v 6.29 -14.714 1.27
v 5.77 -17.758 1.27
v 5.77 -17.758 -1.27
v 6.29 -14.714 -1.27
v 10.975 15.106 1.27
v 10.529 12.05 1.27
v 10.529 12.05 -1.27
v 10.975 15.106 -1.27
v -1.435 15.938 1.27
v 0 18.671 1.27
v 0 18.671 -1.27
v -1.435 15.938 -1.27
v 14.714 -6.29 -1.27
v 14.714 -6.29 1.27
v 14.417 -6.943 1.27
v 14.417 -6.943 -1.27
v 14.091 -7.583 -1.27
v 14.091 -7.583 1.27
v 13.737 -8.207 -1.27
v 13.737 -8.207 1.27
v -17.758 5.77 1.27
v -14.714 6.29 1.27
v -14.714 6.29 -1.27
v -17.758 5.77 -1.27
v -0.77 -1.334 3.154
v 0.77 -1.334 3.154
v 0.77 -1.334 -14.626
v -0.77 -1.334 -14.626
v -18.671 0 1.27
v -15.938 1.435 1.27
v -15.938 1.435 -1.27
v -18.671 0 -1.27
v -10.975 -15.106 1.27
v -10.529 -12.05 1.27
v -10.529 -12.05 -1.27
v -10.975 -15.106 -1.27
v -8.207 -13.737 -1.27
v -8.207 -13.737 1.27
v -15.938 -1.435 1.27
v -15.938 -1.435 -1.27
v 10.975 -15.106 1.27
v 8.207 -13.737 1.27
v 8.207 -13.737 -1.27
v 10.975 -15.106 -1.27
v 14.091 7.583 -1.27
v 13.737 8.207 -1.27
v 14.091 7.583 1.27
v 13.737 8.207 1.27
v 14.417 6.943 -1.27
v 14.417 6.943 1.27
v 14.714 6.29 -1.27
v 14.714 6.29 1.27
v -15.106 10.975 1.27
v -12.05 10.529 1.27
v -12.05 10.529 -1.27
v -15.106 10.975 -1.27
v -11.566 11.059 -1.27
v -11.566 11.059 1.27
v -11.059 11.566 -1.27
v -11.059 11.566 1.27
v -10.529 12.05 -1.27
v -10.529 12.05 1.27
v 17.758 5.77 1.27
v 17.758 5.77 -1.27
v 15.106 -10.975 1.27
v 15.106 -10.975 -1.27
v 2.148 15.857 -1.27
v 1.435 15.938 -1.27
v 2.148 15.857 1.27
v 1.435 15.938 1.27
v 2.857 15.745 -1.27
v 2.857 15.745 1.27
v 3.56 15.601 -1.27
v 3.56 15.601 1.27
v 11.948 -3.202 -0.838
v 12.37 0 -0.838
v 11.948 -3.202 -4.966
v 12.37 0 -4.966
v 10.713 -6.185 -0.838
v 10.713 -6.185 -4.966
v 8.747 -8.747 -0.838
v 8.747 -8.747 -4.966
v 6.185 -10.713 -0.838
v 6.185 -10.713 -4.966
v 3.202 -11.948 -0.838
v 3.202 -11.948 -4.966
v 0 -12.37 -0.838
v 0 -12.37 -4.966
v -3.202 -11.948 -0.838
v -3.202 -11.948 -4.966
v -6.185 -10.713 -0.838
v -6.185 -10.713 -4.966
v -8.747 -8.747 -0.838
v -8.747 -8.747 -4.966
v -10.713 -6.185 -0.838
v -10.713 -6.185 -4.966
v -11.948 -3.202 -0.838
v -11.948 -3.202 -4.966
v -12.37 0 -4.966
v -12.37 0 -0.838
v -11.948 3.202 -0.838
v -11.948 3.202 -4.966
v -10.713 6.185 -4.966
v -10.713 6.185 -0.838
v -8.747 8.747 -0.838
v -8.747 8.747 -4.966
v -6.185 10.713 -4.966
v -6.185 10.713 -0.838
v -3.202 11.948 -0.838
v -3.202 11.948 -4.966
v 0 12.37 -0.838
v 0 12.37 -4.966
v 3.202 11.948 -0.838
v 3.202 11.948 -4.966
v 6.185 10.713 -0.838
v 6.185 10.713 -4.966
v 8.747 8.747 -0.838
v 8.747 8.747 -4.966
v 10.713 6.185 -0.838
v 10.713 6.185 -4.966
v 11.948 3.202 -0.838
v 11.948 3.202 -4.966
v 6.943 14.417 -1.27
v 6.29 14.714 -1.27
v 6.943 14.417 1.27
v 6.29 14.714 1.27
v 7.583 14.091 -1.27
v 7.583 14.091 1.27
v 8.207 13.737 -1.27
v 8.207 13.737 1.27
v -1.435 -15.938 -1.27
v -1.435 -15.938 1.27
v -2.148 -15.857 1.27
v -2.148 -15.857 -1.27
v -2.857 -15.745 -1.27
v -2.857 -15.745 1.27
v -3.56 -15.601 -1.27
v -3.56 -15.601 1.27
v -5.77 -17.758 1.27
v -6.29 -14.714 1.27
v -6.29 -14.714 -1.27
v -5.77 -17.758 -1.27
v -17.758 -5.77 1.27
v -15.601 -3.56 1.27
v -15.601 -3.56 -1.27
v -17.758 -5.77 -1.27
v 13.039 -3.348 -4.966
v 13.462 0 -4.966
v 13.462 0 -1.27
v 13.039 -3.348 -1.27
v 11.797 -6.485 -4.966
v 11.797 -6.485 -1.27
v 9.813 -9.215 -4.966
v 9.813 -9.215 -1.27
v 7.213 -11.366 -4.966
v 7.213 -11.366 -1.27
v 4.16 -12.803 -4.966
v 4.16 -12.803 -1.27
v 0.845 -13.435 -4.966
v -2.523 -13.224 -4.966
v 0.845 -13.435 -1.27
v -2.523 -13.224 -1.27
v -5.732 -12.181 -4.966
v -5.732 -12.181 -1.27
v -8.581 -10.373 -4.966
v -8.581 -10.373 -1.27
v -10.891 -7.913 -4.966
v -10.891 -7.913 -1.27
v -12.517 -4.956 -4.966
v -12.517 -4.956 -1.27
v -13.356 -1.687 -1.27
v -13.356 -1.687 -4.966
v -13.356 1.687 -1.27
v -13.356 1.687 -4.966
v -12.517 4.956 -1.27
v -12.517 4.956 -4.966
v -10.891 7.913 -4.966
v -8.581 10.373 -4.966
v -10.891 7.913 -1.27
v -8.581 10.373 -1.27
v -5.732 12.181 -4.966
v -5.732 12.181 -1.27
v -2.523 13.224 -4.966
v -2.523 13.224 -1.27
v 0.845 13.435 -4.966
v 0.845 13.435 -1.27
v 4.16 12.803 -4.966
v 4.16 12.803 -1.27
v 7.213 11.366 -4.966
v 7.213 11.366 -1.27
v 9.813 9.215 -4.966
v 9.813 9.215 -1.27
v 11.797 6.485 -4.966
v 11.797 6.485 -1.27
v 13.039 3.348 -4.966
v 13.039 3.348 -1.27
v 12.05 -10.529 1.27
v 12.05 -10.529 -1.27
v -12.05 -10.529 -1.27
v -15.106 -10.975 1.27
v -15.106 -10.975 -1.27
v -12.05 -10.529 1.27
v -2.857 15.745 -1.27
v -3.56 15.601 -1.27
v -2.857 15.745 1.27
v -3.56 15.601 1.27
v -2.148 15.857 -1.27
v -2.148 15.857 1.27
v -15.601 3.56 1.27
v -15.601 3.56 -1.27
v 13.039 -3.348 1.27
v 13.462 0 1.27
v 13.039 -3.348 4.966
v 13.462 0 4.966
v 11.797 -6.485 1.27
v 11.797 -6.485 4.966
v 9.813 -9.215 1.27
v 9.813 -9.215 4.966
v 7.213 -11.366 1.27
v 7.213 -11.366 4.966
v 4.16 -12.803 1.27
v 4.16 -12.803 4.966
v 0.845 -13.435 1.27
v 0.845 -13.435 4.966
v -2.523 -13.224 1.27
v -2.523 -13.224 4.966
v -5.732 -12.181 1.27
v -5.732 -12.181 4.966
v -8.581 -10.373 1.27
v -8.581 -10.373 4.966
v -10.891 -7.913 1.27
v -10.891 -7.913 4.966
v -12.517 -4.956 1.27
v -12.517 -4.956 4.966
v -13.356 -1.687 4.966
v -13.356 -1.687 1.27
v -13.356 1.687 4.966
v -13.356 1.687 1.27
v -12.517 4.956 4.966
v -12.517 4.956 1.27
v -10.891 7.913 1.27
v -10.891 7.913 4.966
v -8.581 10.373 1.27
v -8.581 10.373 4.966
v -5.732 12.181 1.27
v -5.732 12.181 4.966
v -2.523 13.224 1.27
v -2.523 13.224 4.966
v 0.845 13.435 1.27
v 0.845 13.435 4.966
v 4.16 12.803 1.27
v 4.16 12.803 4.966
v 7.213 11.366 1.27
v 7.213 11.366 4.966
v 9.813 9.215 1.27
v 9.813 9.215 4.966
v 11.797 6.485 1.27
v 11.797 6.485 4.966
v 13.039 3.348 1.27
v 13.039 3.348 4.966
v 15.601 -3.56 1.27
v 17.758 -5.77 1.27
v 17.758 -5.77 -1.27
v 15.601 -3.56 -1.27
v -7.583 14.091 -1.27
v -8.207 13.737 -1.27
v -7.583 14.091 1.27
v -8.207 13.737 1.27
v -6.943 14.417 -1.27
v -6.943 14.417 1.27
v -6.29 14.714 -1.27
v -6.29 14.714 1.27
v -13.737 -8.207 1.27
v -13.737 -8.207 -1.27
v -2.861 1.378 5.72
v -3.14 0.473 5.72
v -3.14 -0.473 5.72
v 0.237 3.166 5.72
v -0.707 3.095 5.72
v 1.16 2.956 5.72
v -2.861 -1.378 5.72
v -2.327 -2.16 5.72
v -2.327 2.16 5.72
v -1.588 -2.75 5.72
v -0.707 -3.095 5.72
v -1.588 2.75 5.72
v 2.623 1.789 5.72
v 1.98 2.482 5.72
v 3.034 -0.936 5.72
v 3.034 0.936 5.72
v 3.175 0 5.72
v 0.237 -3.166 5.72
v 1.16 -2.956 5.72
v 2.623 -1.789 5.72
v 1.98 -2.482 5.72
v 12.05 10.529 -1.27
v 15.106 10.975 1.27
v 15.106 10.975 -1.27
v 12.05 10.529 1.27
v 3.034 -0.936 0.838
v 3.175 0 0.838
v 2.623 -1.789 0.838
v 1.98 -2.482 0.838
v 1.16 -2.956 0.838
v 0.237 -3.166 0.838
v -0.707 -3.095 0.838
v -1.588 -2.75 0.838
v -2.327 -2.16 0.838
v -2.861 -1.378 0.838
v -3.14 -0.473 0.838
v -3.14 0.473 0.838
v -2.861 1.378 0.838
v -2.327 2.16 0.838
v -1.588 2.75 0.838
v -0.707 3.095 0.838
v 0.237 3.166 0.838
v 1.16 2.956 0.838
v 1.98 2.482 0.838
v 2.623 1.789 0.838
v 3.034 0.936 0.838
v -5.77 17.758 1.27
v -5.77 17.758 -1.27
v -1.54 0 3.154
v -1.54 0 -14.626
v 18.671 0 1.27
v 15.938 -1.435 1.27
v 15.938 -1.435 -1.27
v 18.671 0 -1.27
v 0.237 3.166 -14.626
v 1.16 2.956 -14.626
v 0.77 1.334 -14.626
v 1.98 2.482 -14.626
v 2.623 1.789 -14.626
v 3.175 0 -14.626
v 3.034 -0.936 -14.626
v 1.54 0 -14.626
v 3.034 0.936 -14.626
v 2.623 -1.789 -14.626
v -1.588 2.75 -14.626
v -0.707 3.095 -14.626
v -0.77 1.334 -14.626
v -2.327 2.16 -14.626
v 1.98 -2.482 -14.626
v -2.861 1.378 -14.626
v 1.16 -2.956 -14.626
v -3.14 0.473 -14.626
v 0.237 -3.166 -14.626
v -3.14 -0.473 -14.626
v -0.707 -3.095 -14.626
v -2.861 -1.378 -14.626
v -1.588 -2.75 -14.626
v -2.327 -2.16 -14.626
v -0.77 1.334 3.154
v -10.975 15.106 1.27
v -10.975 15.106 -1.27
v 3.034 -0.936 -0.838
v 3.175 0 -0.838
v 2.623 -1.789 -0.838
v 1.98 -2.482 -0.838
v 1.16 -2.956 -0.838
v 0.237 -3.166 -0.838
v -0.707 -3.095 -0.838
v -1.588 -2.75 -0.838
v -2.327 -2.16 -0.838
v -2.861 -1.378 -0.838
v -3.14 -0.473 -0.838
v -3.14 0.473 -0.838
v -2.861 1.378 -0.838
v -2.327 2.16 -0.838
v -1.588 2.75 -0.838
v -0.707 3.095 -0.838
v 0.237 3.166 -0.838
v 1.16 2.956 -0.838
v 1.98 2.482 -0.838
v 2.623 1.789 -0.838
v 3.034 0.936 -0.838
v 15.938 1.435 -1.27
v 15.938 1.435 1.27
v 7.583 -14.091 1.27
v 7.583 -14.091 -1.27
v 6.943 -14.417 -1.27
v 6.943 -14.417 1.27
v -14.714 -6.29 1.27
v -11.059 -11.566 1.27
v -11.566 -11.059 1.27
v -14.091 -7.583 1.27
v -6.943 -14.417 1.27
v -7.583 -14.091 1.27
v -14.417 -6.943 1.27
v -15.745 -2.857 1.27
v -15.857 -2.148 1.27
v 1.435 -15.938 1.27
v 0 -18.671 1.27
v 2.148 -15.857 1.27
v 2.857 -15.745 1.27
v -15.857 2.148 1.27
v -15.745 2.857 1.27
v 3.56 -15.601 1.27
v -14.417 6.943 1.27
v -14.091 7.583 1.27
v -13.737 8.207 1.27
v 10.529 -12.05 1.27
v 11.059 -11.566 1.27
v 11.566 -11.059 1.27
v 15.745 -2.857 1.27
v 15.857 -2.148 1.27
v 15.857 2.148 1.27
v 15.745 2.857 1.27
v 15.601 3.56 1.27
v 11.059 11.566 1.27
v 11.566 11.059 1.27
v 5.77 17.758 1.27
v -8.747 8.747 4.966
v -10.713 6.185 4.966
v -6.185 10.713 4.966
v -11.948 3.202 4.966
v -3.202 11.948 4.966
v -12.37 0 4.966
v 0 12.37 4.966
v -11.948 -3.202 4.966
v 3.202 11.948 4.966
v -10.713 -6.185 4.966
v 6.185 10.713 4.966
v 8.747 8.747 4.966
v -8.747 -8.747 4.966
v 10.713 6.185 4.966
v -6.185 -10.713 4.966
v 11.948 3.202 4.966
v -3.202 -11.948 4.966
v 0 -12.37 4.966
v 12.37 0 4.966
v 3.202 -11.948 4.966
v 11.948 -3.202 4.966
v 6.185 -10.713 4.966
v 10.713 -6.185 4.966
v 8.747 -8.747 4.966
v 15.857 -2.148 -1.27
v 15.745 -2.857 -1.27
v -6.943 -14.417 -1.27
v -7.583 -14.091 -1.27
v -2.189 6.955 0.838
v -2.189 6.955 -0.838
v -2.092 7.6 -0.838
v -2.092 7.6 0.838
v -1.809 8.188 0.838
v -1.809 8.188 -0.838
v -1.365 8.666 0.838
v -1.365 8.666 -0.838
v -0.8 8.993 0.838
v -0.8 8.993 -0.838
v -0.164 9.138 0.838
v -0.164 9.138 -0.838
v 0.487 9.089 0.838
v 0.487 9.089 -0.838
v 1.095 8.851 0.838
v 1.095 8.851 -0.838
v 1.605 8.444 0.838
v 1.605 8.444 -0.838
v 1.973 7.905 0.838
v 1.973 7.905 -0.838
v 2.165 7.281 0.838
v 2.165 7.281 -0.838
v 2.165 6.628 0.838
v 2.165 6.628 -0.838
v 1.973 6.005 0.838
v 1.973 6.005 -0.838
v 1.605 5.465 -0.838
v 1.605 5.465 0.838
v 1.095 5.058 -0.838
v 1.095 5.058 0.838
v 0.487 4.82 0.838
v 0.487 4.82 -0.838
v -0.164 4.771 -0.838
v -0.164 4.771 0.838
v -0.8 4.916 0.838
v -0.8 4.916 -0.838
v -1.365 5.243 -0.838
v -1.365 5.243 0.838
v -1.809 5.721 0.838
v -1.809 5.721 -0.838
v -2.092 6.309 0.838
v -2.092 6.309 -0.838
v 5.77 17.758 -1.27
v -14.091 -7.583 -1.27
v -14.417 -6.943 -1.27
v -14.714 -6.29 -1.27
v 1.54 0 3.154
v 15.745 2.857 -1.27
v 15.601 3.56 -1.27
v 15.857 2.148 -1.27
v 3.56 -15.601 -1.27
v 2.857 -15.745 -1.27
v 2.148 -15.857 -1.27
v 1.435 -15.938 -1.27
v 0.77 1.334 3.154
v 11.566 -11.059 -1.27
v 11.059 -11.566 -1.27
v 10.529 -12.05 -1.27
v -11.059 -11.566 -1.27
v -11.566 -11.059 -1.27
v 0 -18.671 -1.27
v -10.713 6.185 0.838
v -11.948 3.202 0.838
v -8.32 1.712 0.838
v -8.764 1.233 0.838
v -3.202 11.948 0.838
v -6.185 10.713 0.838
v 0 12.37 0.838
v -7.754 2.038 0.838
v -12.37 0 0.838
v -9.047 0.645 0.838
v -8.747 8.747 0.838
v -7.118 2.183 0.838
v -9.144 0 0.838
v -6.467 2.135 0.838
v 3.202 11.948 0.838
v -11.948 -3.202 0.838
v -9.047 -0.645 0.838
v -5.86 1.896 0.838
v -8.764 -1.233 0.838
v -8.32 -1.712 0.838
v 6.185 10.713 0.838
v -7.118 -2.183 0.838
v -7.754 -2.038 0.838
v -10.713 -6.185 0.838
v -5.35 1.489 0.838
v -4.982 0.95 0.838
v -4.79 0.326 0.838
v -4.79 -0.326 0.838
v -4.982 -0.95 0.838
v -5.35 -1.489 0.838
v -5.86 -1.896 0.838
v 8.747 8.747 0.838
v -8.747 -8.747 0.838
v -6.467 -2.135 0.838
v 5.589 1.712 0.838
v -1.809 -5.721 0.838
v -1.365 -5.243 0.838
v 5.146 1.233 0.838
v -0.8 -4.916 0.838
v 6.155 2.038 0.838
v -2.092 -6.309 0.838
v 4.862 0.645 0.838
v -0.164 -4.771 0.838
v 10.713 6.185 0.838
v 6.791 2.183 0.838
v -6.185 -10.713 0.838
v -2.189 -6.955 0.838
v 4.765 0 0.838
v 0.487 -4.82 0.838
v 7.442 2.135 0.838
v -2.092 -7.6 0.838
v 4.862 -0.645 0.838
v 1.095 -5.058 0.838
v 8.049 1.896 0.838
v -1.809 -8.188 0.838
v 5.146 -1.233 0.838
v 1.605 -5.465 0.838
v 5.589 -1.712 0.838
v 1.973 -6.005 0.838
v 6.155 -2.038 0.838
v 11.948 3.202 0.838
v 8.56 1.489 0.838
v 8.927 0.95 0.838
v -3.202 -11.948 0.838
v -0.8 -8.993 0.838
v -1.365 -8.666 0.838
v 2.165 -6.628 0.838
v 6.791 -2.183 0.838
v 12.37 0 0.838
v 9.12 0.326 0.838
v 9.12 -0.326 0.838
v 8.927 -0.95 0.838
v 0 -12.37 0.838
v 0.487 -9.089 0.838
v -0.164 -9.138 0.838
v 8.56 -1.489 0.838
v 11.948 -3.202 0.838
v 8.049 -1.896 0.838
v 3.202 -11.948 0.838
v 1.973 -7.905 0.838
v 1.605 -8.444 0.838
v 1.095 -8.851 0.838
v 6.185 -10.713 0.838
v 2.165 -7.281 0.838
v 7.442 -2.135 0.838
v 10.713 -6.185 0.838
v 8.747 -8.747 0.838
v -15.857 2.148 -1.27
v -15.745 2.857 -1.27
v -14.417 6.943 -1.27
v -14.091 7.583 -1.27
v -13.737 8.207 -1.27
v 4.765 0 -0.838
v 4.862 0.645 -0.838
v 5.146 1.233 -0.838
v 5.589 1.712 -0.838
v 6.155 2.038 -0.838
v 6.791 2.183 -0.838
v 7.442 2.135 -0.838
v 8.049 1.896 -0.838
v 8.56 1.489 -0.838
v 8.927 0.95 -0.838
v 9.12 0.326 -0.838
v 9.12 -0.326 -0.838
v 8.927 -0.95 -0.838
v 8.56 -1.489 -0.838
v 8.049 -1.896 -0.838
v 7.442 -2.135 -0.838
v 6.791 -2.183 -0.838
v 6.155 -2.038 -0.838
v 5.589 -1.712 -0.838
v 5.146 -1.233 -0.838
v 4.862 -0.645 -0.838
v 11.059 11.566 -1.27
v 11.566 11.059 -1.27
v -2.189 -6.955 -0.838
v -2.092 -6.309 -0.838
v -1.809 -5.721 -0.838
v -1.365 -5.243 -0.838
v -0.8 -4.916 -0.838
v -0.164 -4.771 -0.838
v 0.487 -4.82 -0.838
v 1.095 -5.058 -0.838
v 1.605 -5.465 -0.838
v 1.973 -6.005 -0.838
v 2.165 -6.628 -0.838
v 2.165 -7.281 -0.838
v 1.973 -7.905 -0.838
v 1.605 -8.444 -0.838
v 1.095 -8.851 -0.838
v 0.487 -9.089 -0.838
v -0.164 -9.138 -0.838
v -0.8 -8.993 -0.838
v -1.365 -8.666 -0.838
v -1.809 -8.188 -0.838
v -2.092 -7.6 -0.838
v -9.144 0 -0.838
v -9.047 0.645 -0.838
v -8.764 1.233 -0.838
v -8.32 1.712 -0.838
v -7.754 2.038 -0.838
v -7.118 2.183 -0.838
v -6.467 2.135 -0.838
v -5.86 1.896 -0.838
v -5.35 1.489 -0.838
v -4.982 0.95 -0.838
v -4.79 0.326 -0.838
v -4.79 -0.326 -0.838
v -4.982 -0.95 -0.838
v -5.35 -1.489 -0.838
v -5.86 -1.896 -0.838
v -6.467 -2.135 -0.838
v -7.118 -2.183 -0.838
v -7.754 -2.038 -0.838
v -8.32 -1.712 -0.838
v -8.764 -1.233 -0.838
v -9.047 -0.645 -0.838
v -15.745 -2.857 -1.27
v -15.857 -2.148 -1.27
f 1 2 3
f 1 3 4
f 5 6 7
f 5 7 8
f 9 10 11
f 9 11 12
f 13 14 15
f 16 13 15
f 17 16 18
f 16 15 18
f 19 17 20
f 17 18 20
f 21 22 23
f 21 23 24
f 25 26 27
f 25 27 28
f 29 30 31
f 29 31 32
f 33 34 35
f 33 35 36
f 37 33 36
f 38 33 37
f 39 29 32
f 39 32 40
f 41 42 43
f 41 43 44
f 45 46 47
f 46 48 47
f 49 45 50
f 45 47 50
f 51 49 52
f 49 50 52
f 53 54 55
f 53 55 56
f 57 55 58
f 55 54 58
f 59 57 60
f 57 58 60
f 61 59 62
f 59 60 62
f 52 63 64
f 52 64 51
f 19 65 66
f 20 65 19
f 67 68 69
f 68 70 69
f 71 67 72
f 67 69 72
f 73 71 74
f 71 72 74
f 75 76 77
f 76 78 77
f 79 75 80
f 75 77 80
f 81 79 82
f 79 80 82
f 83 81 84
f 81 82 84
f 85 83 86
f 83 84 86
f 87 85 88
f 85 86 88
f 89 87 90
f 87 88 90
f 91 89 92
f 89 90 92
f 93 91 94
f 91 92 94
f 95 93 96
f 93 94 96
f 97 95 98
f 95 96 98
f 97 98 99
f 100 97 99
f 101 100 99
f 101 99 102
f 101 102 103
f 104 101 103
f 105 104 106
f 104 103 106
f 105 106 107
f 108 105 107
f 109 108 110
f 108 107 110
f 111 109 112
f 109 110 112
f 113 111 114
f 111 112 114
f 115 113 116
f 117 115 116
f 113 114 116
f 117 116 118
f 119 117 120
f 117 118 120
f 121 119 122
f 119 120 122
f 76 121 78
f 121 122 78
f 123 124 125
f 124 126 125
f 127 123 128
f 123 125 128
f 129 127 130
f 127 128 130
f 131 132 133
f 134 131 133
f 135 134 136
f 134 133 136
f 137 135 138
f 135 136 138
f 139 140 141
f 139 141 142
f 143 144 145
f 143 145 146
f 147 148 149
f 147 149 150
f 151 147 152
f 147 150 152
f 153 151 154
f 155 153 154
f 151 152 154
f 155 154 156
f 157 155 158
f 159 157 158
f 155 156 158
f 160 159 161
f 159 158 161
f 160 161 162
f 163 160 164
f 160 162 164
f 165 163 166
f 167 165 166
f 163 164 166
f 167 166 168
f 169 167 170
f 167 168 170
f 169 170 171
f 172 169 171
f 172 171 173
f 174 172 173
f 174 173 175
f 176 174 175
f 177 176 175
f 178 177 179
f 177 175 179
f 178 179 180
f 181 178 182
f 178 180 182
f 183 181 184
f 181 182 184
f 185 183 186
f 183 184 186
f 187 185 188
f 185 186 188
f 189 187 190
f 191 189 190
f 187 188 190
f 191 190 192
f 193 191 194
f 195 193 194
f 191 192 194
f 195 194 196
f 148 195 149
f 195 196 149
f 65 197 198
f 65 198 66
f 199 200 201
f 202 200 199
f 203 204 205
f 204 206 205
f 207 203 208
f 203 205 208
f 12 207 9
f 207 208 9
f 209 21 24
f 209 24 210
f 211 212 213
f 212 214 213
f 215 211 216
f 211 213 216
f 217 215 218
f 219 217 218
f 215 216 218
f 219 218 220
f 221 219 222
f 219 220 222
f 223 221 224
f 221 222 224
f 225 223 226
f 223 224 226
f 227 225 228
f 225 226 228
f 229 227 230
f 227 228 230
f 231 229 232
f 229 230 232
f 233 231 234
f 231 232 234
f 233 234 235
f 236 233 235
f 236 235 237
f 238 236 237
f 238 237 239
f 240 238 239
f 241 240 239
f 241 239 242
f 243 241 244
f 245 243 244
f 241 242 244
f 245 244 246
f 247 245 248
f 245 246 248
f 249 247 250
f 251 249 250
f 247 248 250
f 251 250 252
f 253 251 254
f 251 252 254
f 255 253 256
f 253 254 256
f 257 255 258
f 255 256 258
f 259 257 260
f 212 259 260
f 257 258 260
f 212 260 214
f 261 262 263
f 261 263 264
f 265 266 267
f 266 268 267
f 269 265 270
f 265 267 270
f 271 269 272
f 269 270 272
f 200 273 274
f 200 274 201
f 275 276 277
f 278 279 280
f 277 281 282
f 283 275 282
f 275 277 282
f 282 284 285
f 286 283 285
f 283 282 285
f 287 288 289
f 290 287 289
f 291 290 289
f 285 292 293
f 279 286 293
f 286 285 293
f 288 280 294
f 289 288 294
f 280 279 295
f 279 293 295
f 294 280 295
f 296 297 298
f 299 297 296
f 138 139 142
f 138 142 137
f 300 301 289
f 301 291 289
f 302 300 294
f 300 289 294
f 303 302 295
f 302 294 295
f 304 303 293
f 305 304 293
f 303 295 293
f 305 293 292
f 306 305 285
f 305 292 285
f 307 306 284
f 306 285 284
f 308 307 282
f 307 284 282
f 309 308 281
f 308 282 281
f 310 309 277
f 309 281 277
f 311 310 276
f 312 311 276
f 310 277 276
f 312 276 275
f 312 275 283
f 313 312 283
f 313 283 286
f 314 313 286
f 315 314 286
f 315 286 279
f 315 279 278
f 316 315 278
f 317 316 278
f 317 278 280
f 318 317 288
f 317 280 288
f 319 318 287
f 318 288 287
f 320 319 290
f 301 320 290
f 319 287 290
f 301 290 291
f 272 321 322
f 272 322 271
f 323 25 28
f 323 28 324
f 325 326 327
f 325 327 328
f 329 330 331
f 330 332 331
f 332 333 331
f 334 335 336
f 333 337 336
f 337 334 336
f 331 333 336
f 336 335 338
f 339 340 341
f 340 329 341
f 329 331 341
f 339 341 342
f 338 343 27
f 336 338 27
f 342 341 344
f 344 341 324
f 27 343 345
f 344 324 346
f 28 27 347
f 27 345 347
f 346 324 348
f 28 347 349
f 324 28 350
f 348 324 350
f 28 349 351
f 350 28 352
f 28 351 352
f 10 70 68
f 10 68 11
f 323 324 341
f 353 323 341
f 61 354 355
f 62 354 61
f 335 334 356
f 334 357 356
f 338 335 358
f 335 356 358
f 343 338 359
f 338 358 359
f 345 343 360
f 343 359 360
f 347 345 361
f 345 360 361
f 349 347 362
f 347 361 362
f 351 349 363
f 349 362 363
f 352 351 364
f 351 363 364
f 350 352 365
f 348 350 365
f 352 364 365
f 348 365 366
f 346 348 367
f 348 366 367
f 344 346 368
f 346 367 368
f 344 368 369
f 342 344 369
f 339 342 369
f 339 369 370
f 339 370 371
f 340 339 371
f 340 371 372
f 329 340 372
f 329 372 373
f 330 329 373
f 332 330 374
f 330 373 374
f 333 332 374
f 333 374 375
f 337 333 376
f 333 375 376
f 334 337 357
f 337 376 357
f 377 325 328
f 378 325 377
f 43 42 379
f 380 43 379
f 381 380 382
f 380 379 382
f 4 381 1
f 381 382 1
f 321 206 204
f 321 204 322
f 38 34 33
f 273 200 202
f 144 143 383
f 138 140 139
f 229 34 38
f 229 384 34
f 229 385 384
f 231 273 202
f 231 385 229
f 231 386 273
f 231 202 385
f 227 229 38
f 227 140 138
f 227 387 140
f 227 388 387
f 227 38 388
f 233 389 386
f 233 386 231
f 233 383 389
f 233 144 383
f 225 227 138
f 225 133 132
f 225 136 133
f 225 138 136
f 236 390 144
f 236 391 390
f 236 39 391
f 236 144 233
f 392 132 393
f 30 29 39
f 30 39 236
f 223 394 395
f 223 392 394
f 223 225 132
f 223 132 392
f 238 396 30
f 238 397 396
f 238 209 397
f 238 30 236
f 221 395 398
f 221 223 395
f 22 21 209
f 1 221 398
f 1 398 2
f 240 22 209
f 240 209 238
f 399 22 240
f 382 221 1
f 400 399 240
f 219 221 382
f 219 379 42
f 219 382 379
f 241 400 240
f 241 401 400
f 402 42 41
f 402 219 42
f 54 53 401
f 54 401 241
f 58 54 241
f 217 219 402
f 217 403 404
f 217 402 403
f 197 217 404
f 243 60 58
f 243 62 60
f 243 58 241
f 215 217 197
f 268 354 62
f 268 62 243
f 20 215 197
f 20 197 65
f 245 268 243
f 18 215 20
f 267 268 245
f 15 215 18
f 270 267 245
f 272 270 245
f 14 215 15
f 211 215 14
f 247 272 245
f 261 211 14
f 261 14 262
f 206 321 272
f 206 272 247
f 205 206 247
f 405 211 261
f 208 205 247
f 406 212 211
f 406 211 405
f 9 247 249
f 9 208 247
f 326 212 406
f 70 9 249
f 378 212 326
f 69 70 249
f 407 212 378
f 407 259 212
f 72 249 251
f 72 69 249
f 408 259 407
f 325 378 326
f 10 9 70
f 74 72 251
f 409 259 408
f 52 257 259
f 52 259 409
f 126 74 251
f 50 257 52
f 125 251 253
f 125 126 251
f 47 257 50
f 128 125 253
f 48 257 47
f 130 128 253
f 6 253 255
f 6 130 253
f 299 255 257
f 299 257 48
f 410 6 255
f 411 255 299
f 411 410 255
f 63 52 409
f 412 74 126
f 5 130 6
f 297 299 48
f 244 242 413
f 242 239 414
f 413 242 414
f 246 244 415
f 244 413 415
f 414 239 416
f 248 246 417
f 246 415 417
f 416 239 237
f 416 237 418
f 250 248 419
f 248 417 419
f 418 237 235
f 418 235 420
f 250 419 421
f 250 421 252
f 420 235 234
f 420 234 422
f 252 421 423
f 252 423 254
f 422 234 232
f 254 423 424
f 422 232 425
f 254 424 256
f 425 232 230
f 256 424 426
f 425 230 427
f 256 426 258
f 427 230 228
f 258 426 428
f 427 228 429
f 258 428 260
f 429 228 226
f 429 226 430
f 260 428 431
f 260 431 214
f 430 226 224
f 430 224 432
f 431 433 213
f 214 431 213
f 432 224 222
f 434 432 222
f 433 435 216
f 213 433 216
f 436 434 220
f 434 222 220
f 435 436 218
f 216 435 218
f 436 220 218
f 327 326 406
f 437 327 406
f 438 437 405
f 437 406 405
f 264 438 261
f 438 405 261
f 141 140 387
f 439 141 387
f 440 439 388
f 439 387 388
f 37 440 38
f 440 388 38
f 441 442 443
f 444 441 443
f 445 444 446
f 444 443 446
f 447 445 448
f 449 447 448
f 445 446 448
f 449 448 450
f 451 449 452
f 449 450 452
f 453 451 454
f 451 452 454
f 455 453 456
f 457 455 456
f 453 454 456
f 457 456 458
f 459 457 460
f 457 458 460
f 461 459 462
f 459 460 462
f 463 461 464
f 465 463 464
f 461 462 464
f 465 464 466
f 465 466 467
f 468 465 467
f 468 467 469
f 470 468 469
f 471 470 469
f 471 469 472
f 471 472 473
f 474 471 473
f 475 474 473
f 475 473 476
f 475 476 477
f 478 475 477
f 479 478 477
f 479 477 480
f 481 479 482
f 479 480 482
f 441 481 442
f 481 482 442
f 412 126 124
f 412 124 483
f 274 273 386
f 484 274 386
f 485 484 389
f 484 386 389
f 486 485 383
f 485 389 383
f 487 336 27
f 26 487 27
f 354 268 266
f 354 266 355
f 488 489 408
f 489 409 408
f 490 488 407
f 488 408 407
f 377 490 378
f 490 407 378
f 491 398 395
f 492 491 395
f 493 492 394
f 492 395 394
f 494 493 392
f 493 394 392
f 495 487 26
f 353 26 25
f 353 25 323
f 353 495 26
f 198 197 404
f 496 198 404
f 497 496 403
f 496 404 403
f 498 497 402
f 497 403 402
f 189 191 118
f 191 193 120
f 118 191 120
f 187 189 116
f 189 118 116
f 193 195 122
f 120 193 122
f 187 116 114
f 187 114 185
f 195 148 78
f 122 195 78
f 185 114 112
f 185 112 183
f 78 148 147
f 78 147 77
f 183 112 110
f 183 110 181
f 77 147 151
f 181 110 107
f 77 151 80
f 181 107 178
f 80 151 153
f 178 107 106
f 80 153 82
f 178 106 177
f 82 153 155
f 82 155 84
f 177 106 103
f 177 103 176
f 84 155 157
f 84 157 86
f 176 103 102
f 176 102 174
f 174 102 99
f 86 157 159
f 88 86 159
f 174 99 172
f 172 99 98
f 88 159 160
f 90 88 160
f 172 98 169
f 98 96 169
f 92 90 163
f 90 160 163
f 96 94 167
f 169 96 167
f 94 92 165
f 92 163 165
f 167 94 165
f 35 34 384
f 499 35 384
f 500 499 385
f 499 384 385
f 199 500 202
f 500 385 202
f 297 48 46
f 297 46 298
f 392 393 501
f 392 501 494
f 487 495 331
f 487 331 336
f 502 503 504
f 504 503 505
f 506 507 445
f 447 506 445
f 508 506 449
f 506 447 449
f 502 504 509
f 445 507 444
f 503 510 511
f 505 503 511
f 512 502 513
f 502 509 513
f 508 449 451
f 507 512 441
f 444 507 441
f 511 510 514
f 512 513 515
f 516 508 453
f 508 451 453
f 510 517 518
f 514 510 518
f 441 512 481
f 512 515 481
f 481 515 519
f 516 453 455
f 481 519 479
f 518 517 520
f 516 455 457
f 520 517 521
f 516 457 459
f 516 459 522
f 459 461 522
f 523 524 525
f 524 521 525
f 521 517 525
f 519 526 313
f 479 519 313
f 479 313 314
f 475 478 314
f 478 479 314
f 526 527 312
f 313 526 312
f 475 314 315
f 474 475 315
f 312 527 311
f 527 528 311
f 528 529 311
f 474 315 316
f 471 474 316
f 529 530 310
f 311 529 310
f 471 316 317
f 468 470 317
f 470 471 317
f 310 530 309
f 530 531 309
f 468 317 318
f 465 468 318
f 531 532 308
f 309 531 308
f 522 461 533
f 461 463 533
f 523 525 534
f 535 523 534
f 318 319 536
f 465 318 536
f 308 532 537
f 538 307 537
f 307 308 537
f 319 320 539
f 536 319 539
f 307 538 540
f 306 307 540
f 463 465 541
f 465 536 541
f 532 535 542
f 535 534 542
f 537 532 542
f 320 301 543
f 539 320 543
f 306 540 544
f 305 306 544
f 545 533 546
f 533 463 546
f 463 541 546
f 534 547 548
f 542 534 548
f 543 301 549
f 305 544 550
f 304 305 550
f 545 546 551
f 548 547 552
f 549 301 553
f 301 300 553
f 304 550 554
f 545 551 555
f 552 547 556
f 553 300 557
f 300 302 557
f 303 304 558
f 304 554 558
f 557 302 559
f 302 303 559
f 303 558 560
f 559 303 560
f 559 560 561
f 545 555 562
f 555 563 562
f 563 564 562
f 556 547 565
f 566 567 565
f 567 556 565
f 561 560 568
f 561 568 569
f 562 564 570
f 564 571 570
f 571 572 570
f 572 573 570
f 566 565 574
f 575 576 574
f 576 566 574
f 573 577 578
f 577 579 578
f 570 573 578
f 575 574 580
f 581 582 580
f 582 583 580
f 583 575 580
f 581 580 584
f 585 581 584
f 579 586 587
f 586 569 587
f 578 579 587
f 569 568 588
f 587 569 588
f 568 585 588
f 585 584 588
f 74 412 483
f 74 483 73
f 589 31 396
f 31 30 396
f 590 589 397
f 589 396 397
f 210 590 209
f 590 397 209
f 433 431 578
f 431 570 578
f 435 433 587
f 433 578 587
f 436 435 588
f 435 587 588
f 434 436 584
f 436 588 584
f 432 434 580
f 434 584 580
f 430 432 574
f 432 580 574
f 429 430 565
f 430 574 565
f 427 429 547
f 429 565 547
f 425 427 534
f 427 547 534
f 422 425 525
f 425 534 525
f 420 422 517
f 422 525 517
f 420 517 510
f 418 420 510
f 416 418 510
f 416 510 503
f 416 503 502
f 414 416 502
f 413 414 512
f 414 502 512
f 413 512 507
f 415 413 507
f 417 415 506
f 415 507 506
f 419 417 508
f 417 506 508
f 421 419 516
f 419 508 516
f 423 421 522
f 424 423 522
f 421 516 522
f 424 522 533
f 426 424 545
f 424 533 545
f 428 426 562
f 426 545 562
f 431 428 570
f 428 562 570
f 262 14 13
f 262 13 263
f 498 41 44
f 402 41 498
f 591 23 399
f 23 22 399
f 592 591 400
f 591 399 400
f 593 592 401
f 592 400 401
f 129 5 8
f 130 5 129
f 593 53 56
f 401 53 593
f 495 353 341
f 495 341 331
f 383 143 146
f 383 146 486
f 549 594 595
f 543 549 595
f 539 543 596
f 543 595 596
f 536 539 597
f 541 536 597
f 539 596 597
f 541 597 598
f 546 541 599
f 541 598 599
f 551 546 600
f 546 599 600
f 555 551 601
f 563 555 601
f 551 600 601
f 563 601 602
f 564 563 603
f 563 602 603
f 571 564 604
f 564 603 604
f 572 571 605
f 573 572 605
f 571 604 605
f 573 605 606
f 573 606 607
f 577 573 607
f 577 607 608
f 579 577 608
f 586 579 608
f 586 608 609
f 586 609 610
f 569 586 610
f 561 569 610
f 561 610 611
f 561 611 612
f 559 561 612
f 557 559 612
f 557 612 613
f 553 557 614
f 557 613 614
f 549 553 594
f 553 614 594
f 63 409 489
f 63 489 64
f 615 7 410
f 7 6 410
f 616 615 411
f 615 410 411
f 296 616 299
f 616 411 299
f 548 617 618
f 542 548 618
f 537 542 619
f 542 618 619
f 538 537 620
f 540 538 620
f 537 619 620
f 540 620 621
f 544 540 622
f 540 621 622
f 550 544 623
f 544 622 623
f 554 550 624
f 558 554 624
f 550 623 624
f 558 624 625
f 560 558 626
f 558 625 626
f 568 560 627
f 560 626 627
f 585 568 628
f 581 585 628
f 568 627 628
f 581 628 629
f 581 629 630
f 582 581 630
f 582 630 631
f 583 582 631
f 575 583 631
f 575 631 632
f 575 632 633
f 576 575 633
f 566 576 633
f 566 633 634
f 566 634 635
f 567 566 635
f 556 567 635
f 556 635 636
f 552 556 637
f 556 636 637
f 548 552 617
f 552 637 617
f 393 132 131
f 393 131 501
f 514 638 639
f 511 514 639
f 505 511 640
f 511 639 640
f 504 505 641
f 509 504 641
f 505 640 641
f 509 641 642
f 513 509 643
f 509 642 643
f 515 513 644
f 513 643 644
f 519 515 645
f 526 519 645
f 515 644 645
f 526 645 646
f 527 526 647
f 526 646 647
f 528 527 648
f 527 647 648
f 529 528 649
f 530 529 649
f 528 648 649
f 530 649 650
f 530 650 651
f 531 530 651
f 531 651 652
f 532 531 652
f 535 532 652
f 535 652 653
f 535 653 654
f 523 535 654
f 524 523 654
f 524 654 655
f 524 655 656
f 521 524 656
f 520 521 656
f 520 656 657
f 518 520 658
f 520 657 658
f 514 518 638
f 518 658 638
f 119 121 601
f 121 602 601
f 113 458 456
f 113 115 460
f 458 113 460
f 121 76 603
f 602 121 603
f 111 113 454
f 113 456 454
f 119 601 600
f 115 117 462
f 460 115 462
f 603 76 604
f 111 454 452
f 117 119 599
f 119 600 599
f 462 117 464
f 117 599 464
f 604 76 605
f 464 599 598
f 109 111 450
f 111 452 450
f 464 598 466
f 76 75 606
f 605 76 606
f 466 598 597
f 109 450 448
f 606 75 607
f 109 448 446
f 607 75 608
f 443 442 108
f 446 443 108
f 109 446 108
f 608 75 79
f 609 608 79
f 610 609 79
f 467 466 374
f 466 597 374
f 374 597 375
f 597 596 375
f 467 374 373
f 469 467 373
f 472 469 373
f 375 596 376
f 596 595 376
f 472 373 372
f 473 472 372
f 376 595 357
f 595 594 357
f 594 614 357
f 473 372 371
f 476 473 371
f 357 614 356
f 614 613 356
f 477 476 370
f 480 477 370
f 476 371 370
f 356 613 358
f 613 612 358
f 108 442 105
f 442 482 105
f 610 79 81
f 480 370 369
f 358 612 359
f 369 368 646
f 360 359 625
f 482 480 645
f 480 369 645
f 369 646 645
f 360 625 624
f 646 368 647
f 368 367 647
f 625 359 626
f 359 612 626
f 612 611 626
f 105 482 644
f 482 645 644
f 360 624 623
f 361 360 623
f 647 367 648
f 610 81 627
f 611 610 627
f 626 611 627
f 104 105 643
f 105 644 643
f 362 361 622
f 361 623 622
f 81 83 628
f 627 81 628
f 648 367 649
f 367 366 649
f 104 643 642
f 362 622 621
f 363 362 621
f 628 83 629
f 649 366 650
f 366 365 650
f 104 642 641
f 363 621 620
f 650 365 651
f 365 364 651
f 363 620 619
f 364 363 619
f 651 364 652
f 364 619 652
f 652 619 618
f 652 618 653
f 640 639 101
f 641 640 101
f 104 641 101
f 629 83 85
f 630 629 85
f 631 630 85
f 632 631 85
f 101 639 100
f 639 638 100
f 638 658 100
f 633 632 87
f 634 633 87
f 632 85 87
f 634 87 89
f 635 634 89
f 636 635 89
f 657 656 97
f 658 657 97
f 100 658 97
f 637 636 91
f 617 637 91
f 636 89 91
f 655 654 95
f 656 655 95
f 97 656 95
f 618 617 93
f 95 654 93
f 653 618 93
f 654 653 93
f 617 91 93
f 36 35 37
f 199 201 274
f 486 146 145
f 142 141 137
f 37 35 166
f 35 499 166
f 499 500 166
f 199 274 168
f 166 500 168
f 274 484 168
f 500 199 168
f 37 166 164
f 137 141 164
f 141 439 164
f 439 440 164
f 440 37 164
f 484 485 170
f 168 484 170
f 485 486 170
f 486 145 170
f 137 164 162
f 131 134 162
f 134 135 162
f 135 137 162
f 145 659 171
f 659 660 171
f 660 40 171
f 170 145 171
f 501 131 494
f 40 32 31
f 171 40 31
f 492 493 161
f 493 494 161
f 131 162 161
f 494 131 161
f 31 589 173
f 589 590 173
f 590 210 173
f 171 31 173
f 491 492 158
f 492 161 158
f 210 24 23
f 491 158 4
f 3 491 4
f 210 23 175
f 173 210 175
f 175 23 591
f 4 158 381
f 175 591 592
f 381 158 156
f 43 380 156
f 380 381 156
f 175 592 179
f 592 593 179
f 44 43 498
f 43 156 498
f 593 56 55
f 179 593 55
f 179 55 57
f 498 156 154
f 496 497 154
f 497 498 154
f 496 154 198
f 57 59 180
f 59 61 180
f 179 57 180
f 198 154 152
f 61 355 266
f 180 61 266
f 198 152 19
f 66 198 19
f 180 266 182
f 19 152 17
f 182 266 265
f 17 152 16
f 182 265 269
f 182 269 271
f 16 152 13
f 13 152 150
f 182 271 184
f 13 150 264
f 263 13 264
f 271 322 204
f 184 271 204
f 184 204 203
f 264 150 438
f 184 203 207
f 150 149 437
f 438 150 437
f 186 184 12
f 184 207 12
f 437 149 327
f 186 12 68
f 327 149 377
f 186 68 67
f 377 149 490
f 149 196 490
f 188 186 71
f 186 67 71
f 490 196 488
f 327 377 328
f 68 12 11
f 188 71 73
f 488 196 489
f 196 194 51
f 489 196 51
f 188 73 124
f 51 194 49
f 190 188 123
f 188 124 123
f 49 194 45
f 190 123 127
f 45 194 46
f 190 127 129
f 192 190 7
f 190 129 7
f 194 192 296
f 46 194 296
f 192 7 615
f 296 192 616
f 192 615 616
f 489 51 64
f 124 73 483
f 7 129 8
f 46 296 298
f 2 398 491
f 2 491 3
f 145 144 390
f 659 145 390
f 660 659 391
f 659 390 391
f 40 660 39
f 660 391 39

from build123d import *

# Parameters (mm, degrees)
CUT_EXTRUDE2_DEPTH  = 17.78
SKETCH4_R           = 2.189434211
CUT_EXTRUDE3_DEPTH  = 1.6764
BOSS_EXTRUDE1_DEPTH = 2.54


with BuildPart() as part:
    # Sketch1 → Revolve1 (revolve)
    with BuildSketch(Plane(origin=(0, 0, 0), x_dir=(0, 0, -1), z_dir=(1, 0, 0)), mode=Mode.PRIVATE) as revolve1_sk:
        Polygon((4.9657, 13.462), (1.27, 13.462), (1.27, 16.002), (-1.27, 16.002), (-1.27, 13.462), (-4.9657, 13.462), (-4.9657, 12.3698), (-0.8382, 12.3698), (-0.8382, 3.175), (-5.719832453, 3.175), (-5.719832453, 0), (0, 0), (14.625567547, 0), (14.625567547, 3.175), (0.8382, 3.175), (0.8382, 12.3698), (4.9657, 12.3698), align=None)
    revolve(revolve1_sk.sketch.rotate(Axis((0, 0, 0), (0, 0, -1)), 90), axis=Axis((0, 0, 0), (0, 0, -1)))

    # Sketch3 → Cut-Extrude2 (cut)
    with BuildSketch(Plane(origin=(0, 0, -14.625567547), x_dir=(-1, 0, 0), z_dir=(0, 0, -1))):
        Polygon((1.539793168, 0), (0.769896584, 1.3335), (-0.769896584, 1.3335), (-1.539793168, 0), (-0.769896584, -1.3335), (0.769896584, -1.3335), align=None)
    extrude(amount=-CUT_EXTRUDE2_DEPTH, mode=Mode.SUBTRACT)

    # Sketch4 → Cut-Extrude3 (cut)
    with BuildSketch(Plane(origin=(0, 0, -0.8382), x_dir=(-1, 0, 0), z_dir=(0, 0, -1))):
        with Locations((0, 6.954565789)):
            Circle(SKETCH4_R)
        with Locations((6.954565789, 0)):
            Circle(SKETCH4_R)
        with Locations((0, -6.954565789)):
            Circle(SKETCH4_R)
        with Locations((-6.954565789, 0)):
            Circle(SKETCH4_R)
    extrude(amount=-CUT_EXTRUDE3_DEPTH, mode=Mode.SUBTRACT)

    # Sketch5 → Boss-Extrude1 (add)
    with BuildSketch(Plane.XY.offset(1.27)):
        with BuildLine():
            ThreePointArc((-13.73725383, 8.206817971), (-12.945889944, 9.405739607), (-12.050192599, 10.528858548))
            Line((-12.050192599, 10.528858548), (-15.10552331, 10.974805092))
            Line((-15.10552331, 10.974805092), (-13.73725383, 8.206817971))
        make_face()
        with BuildLine():
            ThreePointArc((-10.528858548, 12.050192599), (-9.405739607, 12.945889944), (-8.206817971, 13.73725383))
            Line((-8.206817971, 13.73725383), (-10.974805092, 15.10552331))
            Line((-10.974805092, 15.10552331), (-10.528858548, 12.050192599))
        make_face()
        with BuildLine():
            ThreePointArc((-6.289825233, 14.714010417), (-4.944889944, 15.218806374), (-3.56010282, 15.600950994))
            Line((-3.56010282, 15.600950994), (-5.769796486, 17.757607659))
            Line((-5.769796486, 17.757607659), (-6.289825233, 14.714010417))
        make_face()
        with BuildLine():
            ThreePointArc((-1.4351, 15.937518376), (0, 16.002), (1.4351, 15.937518376))
            Line((1.4351, 15.937518376), (0, 18.671453646))
            Line((0, 18.671453646), (-1.4351, 15.937518376))
        make_face()
        with BuildLine():
            ThreePointArc((3.56010282, 15.600950994), (4.944889944, 15.218806374), (6.289825233, 14.714010417))
            Line((6.289825233, 14.714010417), (5.769796486, 17.757607659))
            Line((5.769796486, 17.757607659), (3.56010282, 15.600950994))
        make_face()
        with BuildLine():
            ThreePointArc((8.206817971, 13.73725383), (9.405739607, 12.945889944), (10.528858548, 12.050192599))
            Line((10.528858548, 12.050192599), (10.974805092, 15.10552331))
            Line((10.974805092, 15.10552331), (8.206817971, 13.73725383))
        make_face()
        with BuildLine():
            ThreePointArc((12.050192599, 10.528858548), (12.945889944, 9.405739607), (13.73725383, 8.206817971))
            Line((13.73725383, 8.206817971), (15.10552331, 10.974805092))
            Line((15.10552331, 10.974805092), (12.050192599, 10.528858548))
        make_face()
        with BuildLine():
            ThreePointArc((14.714010417, 6.289825233), (15.218806374, 4.944889944), (15.600950994, 3.56010282))
            Line((15.600950994, 3.56010282), (17.757607659, 5.769796486))
            Line((17.757607659, 5.769796486), (14.714010417, 6.289825233))
        make_face()
        with BuildLine():
            Line((18.671453646, 0), (16.002, 0))
            ThreePointArc((16.002, 0), (15.985871466, -0.718273954), (15.937518376, -1.4351))
            Line((15.937518376, -1.4351), (18.671453646, 0))
        make_face()
        with BuildLine():
            ThreePointArc((15.937518376, 1.4351), (15.985871466, 0.718273954), (16.002, 0))
            Line((16.002, 0), (18.671453646, 0))
            Line((18.671453646, 0), (15.937518376, 1.4351))
        make_face()
        with BuildLine():
            Line((17.757607659, -5.769796486), (15.600950994, -3.56010282))
            ThreePointArc((15.600950994, -3.56010282), (15.218806374, -4.944889944), (14.714010417, -6.289825233))
            Line((14.714010417, -6.289825233), (17.757607659, -5.769796486))
        make_face()
        with BuildLine():
            Line((15.10552331, -10.974805092), (13.73725383, -8.206817971))
            ThreePointArc((13.73725383, -8.206817971), (12.945889944, -9.405739607), (12.050192599, -10.528858548))
            Line((12.050192599, -10.528858548), (15.10552331, -10.974805092))
        make_face()
        with BuildLine():
            Line((10.974805092, -15.10552331), (10.528858548, -12.050192599))
            ThreePointArc((10.528858548, -12.050192599), (9.405739607, -12.945889944), (8.206817971, -13.73725383))
            Line((8.206817971, -13.73725383), (10.974805092, -15.10552331))
        make_face()
        with BuildLine():
            Line((5.769796486, -17.757607659), (6.289825233, -14.714010417))
            ThreePointArc((6.289825233, -14.714010417), (4.944889944, -15.218806374), (3.56010282, -15.600950994))
            Line((3.56010282, -15.600950994), (5.769796486, -17.757607659))
        make_face()
        with BuildLine():
            Line((0, -18.671453646), (1.4351, -15.937518376))
            ThreePointArc((1.4351, -15.937518376), (0, -16.002), (-1.4351, -15.937518376))
            Line((-1.4351, -15.937518376), (0, -18.671453646))
        make_face()
        with BuildLine():
            Line((-5.769796486, -17.757607659), (-3.56010282, -15.600950994))
            ThreePointArc((-3.56010282, -15.600950994), (-4.944889944, -15.218806374), (-6.289825233, -14.714010417))
            Line((-6.289825233, -14.714010417), (-5.769796486, -17.757607659))
        make_face()
        with BuildLine():
            Line((-10.974805092, -15.10552331), (-8.206817971, -13.73725383))
            ThreePointArc((-8.206817971, -13.73725383), (-9.405739607, -12.945889944), (-10.528858548, -12.050192599))
            Line((-10.528858548, -12.050192599), (-10.974805092, -15.10552331))
        make_face()
        with BuildLine():
            Line((-15.10552331, -10.974805092), (-12.050192599, -10.528858548))
            ThreePointArc((-12.050192599, -10.528858548), (-12.945889944, -9.405739607), (-13.73725383, -8.206817971))
            Line((-13.73725383, -8.206817971), (-15.10552331, -10.974805092))
        make_face()
        with BuildLine():
            Line((-17.757607659, -5.769796486), (-14.714010417, -6.289825233))
            ThreePointArc((-14.714010417, -6.289825233), (-15.218806374, -4.944889944), (-15.600950994, -3.56010282))
            Line((-15.600950994, -3.56010282), (-17.757607659, -5.769796486))
        make_face()
        with BuildLine():
            ThreePointArc((-15.937518376, -1.4351), (-16.002, 0), (-15.937518376, 1.4351))
            Line((-15.937518376, 1.4351), (-18.671453646, 0))
            Line((-18.671453646, 0), (-15.937518376, -1.4351))
        make_face()
        with BuildLine():
            ThreePointArc((-15.600950994, 3.56010282), (-15.218806374, 4.944889944), (-14.714010417, 6.289825233))
            Line((-14.714010417, 6.289825233), (-17.757607659, 5.769796486))
            Line((-17.757607659, 5.769796486), (-15.600950994, 3.56010282))
        make_face()
    extrude(amount=-BOSS_EXTRUDE1_DEPTH)


solid = part.part
